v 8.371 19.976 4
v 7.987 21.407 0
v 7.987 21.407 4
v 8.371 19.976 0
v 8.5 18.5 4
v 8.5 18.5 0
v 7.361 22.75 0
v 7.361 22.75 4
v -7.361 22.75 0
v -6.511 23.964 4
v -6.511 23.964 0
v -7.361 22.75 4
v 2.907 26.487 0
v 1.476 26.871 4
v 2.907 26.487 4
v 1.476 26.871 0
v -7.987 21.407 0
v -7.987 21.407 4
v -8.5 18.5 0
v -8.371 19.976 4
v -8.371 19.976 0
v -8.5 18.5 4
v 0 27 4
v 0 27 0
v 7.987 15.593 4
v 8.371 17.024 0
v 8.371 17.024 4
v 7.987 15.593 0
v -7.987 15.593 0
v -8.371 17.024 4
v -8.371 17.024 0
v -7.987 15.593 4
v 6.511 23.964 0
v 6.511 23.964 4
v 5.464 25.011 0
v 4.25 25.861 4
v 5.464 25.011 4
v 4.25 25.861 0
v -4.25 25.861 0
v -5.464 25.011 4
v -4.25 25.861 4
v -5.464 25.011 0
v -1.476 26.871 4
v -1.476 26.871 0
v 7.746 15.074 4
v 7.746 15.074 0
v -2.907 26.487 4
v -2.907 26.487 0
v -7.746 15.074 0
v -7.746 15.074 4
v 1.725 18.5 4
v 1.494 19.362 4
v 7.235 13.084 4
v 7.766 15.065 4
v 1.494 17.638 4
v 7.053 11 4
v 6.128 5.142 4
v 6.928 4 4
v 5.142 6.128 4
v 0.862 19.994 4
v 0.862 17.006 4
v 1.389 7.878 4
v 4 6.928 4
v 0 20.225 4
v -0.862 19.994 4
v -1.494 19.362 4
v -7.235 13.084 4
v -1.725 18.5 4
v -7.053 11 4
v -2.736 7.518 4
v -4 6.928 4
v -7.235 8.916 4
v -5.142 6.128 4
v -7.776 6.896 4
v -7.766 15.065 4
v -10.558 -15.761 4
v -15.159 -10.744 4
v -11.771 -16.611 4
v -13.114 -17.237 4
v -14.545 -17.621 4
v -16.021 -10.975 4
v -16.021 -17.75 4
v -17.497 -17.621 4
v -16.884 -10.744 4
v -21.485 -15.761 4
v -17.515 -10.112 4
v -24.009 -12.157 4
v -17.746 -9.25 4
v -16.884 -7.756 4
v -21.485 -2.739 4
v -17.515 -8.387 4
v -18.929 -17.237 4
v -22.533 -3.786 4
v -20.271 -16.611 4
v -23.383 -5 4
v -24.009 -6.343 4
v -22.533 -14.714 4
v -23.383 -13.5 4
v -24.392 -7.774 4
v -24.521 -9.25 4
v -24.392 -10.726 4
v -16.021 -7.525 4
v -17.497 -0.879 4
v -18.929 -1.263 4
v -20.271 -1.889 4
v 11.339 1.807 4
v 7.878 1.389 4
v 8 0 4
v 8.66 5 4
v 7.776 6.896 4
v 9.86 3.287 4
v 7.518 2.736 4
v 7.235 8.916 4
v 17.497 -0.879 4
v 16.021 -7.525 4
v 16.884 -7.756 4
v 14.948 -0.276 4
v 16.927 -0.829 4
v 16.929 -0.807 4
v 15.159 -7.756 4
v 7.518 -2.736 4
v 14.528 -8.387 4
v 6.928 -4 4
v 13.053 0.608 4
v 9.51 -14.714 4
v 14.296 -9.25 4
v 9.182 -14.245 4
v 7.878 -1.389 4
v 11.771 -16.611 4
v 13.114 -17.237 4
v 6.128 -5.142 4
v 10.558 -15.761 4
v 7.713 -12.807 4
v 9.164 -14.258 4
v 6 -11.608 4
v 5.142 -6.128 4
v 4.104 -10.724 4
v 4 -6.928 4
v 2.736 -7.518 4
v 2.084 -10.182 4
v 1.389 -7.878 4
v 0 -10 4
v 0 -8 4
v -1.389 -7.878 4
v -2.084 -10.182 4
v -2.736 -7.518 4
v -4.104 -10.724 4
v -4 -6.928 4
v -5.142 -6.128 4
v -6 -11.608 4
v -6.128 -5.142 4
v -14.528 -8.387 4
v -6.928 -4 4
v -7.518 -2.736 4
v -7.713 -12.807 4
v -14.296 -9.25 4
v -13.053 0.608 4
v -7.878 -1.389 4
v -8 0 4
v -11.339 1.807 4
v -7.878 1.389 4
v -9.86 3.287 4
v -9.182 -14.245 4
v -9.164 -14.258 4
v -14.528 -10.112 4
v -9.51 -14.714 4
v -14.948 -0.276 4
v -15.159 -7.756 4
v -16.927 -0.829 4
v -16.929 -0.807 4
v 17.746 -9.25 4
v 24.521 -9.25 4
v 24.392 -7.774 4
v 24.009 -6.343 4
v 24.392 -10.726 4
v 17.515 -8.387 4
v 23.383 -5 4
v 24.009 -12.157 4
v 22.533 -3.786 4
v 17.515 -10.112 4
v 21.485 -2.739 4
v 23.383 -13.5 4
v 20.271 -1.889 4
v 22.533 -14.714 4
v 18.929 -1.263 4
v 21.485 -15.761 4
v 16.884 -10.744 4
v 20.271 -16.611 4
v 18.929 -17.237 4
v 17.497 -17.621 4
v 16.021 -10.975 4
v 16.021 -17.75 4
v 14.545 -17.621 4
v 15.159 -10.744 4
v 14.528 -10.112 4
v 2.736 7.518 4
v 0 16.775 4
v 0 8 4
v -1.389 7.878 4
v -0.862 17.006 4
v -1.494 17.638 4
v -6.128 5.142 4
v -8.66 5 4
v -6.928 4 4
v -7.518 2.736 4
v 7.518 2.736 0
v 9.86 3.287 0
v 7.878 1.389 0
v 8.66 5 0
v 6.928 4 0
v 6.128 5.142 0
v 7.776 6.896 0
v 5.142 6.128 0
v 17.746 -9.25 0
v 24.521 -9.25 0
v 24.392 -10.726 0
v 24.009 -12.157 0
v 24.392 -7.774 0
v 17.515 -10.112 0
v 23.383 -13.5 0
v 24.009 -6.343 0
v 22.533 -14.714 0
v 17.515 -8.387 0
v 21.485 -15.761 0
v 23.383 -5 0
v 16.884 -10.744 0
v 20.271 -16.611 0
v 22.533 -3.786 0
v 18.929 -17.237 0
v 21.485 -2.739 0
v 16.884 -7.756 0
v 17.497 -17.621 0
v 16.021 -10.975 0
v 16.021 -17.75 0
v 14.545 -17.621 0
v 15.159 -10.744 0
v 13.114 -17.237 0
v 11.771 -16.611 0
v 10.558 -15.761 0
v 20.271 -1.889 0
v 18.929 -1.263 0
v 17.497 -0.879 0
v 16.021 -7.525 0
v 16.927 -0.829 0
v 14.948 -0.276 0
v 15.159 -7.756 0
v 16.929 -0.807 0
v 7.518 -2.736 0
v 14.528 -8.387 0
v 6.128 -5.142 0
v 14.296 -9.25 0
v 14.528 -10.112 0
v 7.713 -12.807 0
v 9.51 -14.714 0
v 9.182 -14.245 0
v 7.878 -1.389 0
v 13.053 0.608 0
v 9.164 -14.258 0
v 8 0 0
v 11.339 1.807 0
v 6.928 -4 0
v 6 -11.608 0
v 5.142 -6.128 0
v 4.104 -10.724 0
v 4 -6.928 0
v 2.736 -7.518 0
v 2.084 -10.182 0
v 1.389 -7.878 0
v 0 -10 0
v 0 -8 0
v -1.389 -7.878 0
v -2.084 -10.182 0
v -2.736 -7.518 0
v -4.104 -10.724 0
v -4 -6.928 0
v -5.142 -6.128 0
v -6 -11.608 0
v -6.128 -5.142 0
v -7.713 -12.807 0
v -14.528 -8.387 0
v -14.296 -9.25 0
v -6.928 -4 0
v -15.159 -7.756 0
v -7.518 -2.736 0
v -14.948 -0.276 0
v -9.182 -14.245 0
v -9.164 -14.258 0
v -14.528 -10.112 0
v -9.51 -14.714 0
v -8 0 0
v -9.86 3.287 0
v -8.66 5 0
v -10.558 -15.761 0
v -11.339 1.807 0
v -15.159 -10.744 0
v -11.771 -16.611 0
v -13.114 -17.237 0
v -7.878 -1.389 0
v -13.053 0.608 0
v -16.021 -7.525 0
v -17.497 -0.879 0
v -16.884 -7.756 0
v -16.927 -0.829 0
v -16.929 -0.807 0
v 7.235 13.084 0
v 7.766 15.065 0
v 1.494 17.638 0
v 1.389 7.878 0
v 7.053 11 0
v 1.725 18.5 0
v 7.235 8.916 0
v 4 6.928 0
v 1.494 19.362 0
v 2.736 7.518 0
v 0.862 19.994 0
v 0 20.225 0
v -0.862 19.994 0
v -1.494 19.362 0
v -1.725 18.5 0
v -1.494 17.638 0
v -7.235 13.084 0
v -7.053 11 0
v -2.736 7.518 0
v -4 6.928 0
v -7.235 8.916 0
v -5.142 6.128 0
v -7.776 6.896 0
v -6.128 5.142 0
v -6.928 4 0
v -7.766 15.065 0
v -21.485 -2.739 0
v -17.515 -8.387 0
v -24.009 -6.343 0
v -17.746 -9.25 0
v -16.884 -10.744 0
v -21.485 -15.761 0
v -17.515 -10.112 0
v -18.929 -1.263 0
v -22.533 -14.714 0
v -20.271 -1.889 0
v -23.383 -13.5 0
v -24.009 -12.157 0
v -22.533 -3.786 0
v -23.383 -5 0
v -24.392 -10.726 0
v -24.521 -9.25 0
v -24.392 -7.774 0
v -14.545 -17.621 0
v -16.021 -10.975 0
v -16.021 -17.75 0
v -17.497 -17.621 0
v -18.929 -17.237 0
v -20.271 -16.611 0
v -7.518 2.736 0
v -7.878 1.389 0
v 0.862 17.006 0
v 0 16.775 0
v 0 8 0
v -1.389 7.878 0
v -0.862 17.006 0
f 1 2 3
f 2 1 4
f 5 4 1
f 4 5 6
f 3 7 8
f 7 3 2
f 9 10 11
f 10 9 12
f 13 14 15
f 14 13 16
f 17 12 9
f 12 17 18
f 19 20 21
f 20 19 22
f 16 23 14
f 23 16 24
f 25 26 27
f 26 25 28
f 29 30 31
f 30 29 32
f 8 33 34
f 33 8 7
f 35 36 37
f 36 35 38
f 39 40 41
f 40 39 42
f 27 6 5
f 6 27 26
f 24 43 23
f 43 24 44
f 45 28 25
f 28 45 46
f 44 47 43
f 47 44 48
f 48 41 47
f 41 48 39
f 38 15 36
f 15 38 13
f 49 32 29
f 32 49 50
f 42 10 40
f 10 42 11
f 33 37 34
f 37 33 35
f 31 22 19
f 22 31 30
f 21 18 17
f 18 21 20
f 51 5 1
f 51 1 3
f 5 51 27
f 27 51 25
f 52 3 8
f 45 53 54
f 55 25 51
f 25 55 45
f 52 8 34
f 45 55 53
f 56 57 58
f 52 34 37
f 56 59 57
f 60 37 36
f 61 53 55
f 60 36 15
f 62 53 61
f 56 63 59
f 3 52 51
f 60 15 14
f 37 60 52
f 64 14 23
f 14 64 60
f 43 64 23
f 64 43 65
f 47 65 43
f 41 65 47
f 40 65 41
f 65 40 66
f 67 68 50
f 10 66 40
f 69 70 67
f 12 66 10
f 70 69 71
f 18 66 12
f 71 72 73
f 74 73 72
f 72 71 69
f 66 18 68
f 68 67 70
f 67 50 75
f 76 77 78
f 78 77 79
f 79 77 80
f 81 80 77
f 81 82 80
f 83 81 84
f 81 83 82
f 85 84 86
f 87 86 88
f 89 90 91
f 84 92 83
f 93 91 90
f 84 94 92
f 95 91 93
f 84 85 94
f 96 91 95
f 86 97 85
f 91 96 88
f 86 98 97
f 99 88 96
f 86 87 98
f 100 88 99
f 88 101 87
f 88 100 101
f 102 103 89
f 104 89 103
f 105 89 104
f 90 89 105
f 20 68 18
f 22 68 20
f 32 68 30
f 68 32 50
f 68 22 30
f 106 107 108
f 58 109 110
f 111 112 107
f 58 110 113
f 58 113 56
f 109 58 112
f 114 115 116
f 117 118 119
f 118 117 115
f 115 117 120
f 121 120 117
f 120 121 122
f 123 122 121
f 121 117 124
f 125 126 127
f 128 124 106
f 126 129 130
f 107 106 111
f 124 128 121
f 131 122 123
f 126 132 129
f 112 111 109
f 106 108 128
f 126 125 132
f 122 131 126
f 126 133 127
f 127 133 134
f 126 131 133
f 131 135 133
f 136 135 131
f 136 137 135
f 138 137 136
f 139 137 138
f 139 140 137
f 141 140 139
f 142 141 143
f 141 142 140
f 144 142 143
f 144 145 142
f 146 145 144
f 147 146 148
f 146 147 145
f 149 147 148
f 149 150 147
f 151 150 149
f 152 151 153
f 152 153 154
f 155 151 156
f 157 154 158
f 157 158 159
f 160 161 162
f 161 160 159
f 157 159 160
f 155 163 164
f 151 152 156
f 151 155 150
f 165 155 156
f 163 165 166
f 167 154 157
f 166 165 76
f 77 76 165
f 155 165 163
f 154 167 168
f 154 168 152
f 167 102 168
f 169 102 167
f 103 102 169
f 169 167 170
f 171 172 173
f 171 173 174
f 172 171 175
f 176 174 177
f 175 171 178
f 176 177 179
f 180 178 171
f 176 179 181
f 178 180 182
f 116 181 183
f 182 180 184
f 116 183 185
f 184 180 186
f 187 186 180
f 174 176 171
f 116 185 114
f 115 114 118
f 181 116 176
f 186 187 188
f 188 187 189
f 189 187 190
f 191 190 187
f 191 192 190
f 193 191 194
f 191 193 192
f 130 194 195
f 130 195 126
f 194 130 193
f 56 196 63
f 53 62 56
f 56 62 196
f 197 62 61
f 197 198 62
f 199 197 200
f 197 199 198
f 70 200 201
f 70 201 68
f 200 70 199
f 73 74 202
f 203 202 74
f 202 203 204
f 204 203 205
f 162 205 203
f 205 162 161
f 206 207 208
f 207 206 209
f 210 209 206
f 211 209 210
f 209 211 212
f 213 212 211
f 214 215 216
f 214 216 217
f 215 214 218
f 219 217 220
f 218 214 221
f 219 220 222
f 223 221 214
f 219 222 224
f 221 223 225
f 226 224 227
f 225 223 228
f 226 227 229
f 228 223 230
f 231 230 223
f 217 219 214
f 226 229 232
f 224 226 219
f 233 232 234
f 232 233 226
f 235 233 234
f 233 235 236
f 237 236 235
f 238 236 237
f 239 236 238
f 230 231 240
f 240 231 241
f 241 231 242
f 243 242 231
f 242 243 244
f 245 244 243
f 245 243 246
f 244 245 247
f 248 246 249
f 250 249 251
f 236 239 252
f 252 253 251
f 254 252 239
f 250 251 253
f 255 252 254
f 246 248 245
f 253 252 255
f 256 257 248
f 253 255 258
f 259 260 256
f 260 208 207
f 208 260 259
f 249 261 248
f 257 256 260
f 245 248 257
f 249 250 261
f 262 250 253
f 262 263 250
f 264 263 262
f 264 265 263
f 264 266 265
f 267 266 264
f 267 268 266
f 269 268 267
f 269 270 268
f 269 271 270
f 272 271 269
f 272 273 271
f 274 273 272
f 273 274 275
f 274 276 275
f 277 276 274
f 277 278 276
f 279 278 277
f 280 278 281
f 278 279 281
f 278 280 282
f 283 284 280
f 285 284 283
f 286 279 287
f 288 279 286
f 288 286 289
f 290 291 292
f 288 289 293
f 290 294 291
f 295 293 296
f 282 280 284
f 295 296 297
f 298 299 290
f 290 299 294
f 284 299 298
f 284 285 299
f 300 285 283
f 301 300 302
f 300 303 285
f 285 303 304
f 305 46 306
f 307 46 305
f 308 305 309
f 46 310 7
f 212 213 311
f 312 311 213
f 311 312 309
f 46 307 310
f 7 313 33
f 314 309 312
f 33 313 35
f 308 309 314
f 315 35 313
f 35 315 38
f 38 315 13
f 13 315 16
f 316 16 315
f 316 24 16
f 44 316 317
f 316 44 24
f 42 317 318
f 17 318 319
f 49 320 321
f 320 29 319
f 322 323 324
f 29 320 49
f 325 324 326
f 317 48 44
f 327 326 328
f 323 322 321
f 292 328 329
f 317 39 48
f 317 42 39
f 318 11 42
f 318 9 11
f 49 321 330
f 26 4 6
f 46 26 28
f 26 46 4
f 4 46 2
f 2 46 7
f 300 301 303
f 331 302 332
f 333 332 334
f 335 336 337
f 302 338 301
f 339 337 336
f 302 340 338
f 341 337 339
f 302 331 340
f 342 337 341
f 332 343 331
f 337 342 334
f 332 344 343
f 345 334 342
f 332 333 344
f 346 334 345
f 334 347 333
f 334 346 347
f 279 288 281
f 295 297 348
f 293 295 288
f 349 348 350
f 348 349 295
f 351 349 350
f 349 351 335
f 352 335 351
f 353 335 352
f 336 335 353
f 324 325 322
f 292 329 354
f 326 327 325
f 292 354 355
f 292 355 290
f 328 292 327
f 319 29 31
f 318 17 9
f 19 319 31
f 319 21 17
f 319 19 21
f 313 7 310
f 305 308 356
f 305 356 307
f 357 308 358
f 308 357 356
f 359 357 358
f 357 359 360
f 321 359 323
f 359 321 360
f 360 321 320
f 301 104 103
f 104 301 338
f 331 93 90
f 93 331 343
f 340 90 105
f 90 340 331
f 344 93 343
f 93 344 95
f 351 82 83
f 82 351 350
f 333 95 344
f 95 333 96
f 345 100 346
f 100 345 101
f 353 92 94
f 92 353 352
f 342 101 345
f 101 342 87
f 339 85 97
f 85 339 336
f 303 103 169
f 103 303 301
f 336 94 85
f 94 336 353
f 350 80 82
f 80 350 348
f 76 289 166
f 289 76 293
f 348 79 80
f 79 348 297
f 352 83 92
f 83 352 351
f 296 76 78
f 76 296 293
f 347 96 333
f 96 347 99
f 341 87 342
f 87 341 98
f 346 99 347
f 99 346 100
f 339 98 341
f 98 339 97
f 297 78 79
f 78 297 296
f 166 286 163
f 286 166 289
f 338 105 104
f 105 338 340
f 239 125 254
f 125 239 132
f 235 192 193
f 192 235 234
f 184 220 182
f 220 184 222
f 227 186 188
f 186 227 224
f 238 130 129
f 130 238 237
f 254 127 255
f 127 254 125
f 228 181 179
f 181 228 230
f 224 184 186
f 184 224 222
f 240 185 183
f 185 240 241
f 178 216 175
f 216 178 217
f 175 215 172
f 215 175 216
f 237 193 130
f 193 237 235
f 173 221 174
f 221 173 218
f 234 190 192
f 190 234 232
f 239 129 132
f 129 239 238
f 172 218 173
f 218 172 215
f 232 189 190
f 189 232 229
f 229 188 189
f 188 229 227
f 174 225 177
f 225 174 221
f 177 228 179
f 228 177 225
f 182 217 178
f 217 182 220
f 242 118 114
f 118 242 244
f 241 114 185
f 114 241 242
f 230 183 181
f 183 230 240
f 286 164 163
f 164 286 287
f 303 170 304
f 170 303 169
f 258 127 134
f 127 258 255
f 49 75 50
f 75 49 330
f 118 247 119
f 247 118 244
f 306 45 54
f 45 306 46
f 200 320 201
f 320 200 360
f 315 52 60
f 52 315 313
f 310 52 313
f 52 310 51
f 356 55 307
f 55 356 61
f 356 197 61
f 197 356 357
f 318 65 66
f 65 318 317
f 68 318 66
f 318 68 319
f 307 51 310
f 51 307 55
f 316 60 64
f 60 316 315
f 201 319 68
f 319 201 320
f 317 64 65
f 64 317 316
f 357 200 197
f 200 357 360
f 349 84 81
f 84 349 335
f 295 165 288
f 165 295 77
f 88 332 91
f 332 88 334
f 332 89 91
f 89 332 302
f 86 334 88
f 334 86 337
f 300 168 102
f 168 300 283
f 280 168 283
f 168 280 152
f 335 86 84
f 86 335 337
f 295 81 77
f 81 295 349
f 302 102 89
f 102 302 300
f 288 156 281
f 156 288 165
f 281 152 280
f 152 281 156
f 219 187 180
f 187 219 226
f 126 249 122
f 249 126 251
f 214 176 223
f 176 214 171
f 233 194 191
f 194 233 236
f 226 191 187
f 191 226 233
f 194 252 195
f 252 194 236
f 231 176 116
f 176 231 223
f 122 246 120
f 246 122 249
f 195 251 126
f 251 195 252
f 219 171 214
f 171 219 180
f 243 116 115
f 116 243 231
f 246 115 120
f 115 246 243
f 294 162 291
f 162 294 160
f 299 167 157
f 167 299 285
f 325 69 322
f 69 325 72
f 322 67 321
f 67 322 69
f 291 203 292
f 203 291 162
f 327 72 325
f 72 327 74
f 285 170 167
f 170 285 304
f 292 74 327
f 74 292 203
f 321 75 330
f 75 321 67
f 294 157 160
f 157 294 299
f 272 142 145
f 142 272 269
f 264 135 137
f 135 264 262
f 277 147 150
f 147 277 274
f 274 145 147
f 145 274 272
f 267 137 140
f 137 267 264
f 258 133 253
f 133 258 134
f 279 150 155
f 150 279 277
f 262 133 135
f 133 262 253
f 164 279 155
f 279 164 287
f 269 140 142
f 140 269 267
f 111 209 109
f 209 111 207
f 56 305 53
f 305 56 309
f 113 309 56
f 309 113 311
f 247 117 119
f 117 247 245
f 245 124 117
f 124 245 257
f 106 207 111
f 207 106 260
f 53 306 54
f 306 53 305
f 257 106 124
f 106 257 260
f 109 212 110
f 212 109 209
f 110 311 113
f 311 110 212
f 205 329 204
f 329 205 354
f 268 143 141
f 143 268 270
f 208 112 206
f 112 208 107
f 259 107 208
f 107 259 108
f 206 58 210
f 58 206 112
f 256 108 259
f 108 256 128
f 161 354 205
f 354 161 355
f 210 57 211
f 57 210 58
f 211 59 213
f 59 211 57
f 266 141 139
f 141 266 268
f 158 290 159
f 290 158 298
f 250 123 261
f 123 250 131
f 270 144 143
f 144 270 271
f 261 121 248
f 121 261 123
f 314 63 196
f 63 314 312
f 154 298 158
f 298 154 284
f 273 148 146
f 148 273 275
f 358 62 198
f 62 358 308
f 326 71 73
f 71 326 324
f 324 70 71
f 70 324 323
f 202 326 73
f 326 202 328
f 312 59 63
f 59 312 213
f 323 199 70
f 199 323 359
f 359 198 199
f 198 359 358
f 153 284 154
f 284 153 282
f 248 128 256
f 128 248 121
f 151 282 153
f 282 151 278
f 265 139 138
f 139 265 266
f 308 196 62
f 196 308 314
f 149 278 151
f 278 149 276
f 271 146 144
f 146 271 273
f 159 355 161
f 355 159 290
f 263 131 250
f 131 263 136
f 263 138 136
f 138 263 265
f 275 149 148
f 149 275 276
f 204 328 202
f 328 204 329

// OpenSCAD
// file: fan_mount.scad
/*
OPENSCAD Library file by the DoomMeister
Mounting surround for small DC fans (25 - 120mm)

Data taken from various places around the internet.
http://www.qwikflow.com/dc_fans.html

//Released under the terms of the GNU GPL v3.0
This program is free software: you can redistribute it and/or modify
it under the terms of the GNU General Public License as published by
the Free Software Foundation, either version 3 of the License, or
(at your option) any later version.

This program is distributed in the hope that it will be useful,
but WITHOUT ANY WARRANTY; without even the implied warranty of
MERCHANTABILITY or FITNESS FOR A PARTICULAR PURPOSE. See the
GNU General Public License for more details.

You should have received a copy of the GNU General Public License
along with this program. If not, see <http://www.gnu.org/licenses/>.
*/

//uncomment this for example
//fan_mount(size=60,thick=3);

module fan_mount(size=40,thick = 4)
{
if(size == 25)
	{
	_fan_mount(
			fan_size = 25,
			fan_mounting_pitch = 20,
			fan_m_hole_dia = 3,
			holder_thickness = thick
		 );
	}
if(size == 30)
	{
	_fan_mount(
			fan_size = 30,
			fan_mounting_pitch = 24,
			fan_m_hole_dia = 3,
			holder_thickness = thick
		 );
	}

if(size == 40)
	{
	_fan_mount(
			fan_size = 40,
			fan_mounting_pitch = 32,
			fan_m_hole_dia = 3.5,
			holder_thickness = thick
		 );
	}
if(size == 45)
	{
	_fan_mount(
			fan_size = 45,
			fan_mounting_pitch = 37,
			fan_m_hole_dia = 4.3,
			holder_thickness = thick
		 );
	}
if(size == 60)
	{
	_fan_mount(
			fan_size = 60,
			fan_mounting_pitch = 50,
			fan_m_hole_dia = 4.4,
			holder_thickness = thick
		 );
	}
if(size == 80)
	{
	_fan_mount(
			fan_size = 80,
			fan_mounting_pitch = 71.5,
			fan_m_hole_dia = 4.4,
			holder_thickness = thick
		 );
	}

if(size == 120)
	{
	_fan_mount(
			fan_size = 120,
			fan_mounting_pitch = 105,
			fan_m_hole_dia = 4.4,
			holder_thickness = thick
		 );
	}
}


//inner module
module _fan_mount(
			fan_size, //nominsl size of fan
			fan_mounting_pitch, //pitch between mounting holes
			fan_m_hole_dia, //mounting hole diameter
			holder_thickness //user defined thickness
		 )
{

offset1 = (fan_size-(fan_mounting_pitch + fan_m_hole_dia))/2;
offset2 = (fan_size-(fan_mounting_pitch))/2;
offset3 = offset2 + fan_mounting_pitch;
thickness = (fan_size-fan_mounting_pitch)/2;	
			
			//difference()
			//{
			linear_extrude(height = holder_thickness)
			union()
			{	
			difference()
			{
				translate([fan_m_hole_dia/2,fan_m_hole_dia/2,0])
				minkowski()
				{	
					square([fan_size - fan_m_hole_dia,fan_size - fan_m_hole_dia]);
					circle(r= fan_m_hole_dia/2, $fn=20);
				}
			
					translate([offset1,offset1,0])
					square([fan_mounting_pitch + fan_m_hole_dia,fan_mounting_pitch + fan_m_hole_dia]);
				}
				translate([offset2,offset2,0])
				rotate([0,0,0])_corner_hole();
				translate([offset3,offset2,0])
				rotate([0,0,90])_corner_hole();
				translate([offset2,offset3,0])
				rotate([0,0,90])_corner_hole();
				translate([offset3,offset3,0])
				rotate([0,0,0])_corner_hole();
			}

module _corner_hole()
{
				difference(){
					union(){
							difference(){
							square([fan_m_hole_dia + thickness,fan_m_hole_dia + thickness],center=true);
							square([(fan_m_hole_dia + thickness)/2,(fan_m_hole_dia + thickness)/2],center=false);
							translate([-(fan_m_hole_dia + thickness)/2,-(fan_m_hole_dia + thickness)/2])
							square([(fan_m_hole_dia + thickness)/2,(fan_m_hole_dia + thickness)/2],center=false);
							}
					circle(r=(fan_m_hole_dia + thickness)/2, $fn=20);
					}
					circle(r=(fan_m_hole_dia)/2, $fn=20);
				}
}


echo(offset1,offset2,thickness);
}
// file: configuration.scad
// Increase this if your slicer or printer make holes too tight.
extra_radius = 0.1;

// OD = outside diameter, corner to corner.
m3_nut_od = 6.1;
m3_nut_radius = m3_nut_od/2 + 0.2 + extra_radius;

// Major diameter of metric 3mm thread.
m3_major = 2.85;
m3_radius = m3_major/2 + extra_radius;
m3_wide_radius = m3_major/2 + extra_radius + 0.2;

// NEMA17 stepper motors.
motor_shaft_diameter = 5;
motor_shaft_radius = motor_shaft_diameter/2 + extra_radius;

// Frame brackets. M3x8mm screws work best with 3.6 mm brackets.
thickness = 3.6;

// OpenBeam or Misumi. Currently only 15x15 mm, but there is a plan
// to make models more parametric and allow 20x20 mm in the future.
extrusion = 15;
// main file
include <configuration.scad>;
include <fan_mount.scad>;

separation = 44;  // Distance between ball joint mounting faces.
offset = 22;  // Same as DELTA_EFFECTOR_OFFSET in Marlin.
mount_radius = 18.5;  // Hotend mounting screws, standard would be 25mm.
jhead_od_radius = 8;  // Hole for the hotend (J-Head diameter is 16mm).
jhead_id_radius = 6;
height = 4;
jhead_height=2.5;

module fan_stud(){
       difference(){
          cube([40,10,8]);
          translate([0,4,0]) cube([40,6,4]);
          }
}


module A8452_mount() {
           difference(){
             cube([16,27,4]);
             union() {
               translate([3,8,0]) cylinder(r=m3_wide_radius, h=2*height, center=true, $fn=12);
               translate([3,23,0]) cylinder(r=m3_wide_radius, h=2*height, center=true, $fn=12);
              }
          }
}

module mount_cap() {
  difference() {
    union() {
        // Mount for MMA8452 Module
        // translate([-8,mount_radius+12.2,-2]) rotate(a=[90,0,0]) A8452_mount();        
        
        // Do a bracket to push the fan down a bit
        // translate([-20,-17,-2]) rotate(a=[90,0,0]) fan_stud();
        // translate([-20,-21,8]) rotate(a=[90,0,0]) fan_mount(size=40,thick=4);    
		cylinder(r=offset-5, h=height, center=true, $fn=36);
		
		 for (a = [0:120:359]) rotate([0, 0, a]) {
      	translate([0, mount_radius, 0])	cylinder(r=8.5, h=height, center=true, $fn=36);
    		}
        
	}
    
    translate([0, 0, -height/2])cylinder(r=jhead_od_radius, h=height, $fn=36);
    translate([0, 0, -height/2+jhead_height])cylinder(r=jhead_od_radius, h=jhead_height, $fn=36);

    for (a = [0:120:359]) rotate([0, 0, a]) {
      translate([0, mount_radius, height/2])	cylinder(r=m3_wide_radius, h=2*height, center=true, $fn=12);
    }

	
    for (a = [60:120:359]) rotate([0, 0, a]) {
      translate([0, offset, height/2])	cylinder(r=12, h=2*height, center=true, $fn=36);
    }

  }
// Mount for FSR
//        difference(){
//          translate([15, mount_radius-10, 0]) cylinder(r=8.5, h=height, center=true, $fn=36);
//          union() {
//              translate([15, mount_radius-10, height-2]) cylinder(r=6.0, h=height/2, center=true, $fn=36);
//              translate([14, mount_radius-14, height-2]) cube([10,6,height/2]);
//              }
//          }
}

translate([0, 0, height/2]) mount_cap();
